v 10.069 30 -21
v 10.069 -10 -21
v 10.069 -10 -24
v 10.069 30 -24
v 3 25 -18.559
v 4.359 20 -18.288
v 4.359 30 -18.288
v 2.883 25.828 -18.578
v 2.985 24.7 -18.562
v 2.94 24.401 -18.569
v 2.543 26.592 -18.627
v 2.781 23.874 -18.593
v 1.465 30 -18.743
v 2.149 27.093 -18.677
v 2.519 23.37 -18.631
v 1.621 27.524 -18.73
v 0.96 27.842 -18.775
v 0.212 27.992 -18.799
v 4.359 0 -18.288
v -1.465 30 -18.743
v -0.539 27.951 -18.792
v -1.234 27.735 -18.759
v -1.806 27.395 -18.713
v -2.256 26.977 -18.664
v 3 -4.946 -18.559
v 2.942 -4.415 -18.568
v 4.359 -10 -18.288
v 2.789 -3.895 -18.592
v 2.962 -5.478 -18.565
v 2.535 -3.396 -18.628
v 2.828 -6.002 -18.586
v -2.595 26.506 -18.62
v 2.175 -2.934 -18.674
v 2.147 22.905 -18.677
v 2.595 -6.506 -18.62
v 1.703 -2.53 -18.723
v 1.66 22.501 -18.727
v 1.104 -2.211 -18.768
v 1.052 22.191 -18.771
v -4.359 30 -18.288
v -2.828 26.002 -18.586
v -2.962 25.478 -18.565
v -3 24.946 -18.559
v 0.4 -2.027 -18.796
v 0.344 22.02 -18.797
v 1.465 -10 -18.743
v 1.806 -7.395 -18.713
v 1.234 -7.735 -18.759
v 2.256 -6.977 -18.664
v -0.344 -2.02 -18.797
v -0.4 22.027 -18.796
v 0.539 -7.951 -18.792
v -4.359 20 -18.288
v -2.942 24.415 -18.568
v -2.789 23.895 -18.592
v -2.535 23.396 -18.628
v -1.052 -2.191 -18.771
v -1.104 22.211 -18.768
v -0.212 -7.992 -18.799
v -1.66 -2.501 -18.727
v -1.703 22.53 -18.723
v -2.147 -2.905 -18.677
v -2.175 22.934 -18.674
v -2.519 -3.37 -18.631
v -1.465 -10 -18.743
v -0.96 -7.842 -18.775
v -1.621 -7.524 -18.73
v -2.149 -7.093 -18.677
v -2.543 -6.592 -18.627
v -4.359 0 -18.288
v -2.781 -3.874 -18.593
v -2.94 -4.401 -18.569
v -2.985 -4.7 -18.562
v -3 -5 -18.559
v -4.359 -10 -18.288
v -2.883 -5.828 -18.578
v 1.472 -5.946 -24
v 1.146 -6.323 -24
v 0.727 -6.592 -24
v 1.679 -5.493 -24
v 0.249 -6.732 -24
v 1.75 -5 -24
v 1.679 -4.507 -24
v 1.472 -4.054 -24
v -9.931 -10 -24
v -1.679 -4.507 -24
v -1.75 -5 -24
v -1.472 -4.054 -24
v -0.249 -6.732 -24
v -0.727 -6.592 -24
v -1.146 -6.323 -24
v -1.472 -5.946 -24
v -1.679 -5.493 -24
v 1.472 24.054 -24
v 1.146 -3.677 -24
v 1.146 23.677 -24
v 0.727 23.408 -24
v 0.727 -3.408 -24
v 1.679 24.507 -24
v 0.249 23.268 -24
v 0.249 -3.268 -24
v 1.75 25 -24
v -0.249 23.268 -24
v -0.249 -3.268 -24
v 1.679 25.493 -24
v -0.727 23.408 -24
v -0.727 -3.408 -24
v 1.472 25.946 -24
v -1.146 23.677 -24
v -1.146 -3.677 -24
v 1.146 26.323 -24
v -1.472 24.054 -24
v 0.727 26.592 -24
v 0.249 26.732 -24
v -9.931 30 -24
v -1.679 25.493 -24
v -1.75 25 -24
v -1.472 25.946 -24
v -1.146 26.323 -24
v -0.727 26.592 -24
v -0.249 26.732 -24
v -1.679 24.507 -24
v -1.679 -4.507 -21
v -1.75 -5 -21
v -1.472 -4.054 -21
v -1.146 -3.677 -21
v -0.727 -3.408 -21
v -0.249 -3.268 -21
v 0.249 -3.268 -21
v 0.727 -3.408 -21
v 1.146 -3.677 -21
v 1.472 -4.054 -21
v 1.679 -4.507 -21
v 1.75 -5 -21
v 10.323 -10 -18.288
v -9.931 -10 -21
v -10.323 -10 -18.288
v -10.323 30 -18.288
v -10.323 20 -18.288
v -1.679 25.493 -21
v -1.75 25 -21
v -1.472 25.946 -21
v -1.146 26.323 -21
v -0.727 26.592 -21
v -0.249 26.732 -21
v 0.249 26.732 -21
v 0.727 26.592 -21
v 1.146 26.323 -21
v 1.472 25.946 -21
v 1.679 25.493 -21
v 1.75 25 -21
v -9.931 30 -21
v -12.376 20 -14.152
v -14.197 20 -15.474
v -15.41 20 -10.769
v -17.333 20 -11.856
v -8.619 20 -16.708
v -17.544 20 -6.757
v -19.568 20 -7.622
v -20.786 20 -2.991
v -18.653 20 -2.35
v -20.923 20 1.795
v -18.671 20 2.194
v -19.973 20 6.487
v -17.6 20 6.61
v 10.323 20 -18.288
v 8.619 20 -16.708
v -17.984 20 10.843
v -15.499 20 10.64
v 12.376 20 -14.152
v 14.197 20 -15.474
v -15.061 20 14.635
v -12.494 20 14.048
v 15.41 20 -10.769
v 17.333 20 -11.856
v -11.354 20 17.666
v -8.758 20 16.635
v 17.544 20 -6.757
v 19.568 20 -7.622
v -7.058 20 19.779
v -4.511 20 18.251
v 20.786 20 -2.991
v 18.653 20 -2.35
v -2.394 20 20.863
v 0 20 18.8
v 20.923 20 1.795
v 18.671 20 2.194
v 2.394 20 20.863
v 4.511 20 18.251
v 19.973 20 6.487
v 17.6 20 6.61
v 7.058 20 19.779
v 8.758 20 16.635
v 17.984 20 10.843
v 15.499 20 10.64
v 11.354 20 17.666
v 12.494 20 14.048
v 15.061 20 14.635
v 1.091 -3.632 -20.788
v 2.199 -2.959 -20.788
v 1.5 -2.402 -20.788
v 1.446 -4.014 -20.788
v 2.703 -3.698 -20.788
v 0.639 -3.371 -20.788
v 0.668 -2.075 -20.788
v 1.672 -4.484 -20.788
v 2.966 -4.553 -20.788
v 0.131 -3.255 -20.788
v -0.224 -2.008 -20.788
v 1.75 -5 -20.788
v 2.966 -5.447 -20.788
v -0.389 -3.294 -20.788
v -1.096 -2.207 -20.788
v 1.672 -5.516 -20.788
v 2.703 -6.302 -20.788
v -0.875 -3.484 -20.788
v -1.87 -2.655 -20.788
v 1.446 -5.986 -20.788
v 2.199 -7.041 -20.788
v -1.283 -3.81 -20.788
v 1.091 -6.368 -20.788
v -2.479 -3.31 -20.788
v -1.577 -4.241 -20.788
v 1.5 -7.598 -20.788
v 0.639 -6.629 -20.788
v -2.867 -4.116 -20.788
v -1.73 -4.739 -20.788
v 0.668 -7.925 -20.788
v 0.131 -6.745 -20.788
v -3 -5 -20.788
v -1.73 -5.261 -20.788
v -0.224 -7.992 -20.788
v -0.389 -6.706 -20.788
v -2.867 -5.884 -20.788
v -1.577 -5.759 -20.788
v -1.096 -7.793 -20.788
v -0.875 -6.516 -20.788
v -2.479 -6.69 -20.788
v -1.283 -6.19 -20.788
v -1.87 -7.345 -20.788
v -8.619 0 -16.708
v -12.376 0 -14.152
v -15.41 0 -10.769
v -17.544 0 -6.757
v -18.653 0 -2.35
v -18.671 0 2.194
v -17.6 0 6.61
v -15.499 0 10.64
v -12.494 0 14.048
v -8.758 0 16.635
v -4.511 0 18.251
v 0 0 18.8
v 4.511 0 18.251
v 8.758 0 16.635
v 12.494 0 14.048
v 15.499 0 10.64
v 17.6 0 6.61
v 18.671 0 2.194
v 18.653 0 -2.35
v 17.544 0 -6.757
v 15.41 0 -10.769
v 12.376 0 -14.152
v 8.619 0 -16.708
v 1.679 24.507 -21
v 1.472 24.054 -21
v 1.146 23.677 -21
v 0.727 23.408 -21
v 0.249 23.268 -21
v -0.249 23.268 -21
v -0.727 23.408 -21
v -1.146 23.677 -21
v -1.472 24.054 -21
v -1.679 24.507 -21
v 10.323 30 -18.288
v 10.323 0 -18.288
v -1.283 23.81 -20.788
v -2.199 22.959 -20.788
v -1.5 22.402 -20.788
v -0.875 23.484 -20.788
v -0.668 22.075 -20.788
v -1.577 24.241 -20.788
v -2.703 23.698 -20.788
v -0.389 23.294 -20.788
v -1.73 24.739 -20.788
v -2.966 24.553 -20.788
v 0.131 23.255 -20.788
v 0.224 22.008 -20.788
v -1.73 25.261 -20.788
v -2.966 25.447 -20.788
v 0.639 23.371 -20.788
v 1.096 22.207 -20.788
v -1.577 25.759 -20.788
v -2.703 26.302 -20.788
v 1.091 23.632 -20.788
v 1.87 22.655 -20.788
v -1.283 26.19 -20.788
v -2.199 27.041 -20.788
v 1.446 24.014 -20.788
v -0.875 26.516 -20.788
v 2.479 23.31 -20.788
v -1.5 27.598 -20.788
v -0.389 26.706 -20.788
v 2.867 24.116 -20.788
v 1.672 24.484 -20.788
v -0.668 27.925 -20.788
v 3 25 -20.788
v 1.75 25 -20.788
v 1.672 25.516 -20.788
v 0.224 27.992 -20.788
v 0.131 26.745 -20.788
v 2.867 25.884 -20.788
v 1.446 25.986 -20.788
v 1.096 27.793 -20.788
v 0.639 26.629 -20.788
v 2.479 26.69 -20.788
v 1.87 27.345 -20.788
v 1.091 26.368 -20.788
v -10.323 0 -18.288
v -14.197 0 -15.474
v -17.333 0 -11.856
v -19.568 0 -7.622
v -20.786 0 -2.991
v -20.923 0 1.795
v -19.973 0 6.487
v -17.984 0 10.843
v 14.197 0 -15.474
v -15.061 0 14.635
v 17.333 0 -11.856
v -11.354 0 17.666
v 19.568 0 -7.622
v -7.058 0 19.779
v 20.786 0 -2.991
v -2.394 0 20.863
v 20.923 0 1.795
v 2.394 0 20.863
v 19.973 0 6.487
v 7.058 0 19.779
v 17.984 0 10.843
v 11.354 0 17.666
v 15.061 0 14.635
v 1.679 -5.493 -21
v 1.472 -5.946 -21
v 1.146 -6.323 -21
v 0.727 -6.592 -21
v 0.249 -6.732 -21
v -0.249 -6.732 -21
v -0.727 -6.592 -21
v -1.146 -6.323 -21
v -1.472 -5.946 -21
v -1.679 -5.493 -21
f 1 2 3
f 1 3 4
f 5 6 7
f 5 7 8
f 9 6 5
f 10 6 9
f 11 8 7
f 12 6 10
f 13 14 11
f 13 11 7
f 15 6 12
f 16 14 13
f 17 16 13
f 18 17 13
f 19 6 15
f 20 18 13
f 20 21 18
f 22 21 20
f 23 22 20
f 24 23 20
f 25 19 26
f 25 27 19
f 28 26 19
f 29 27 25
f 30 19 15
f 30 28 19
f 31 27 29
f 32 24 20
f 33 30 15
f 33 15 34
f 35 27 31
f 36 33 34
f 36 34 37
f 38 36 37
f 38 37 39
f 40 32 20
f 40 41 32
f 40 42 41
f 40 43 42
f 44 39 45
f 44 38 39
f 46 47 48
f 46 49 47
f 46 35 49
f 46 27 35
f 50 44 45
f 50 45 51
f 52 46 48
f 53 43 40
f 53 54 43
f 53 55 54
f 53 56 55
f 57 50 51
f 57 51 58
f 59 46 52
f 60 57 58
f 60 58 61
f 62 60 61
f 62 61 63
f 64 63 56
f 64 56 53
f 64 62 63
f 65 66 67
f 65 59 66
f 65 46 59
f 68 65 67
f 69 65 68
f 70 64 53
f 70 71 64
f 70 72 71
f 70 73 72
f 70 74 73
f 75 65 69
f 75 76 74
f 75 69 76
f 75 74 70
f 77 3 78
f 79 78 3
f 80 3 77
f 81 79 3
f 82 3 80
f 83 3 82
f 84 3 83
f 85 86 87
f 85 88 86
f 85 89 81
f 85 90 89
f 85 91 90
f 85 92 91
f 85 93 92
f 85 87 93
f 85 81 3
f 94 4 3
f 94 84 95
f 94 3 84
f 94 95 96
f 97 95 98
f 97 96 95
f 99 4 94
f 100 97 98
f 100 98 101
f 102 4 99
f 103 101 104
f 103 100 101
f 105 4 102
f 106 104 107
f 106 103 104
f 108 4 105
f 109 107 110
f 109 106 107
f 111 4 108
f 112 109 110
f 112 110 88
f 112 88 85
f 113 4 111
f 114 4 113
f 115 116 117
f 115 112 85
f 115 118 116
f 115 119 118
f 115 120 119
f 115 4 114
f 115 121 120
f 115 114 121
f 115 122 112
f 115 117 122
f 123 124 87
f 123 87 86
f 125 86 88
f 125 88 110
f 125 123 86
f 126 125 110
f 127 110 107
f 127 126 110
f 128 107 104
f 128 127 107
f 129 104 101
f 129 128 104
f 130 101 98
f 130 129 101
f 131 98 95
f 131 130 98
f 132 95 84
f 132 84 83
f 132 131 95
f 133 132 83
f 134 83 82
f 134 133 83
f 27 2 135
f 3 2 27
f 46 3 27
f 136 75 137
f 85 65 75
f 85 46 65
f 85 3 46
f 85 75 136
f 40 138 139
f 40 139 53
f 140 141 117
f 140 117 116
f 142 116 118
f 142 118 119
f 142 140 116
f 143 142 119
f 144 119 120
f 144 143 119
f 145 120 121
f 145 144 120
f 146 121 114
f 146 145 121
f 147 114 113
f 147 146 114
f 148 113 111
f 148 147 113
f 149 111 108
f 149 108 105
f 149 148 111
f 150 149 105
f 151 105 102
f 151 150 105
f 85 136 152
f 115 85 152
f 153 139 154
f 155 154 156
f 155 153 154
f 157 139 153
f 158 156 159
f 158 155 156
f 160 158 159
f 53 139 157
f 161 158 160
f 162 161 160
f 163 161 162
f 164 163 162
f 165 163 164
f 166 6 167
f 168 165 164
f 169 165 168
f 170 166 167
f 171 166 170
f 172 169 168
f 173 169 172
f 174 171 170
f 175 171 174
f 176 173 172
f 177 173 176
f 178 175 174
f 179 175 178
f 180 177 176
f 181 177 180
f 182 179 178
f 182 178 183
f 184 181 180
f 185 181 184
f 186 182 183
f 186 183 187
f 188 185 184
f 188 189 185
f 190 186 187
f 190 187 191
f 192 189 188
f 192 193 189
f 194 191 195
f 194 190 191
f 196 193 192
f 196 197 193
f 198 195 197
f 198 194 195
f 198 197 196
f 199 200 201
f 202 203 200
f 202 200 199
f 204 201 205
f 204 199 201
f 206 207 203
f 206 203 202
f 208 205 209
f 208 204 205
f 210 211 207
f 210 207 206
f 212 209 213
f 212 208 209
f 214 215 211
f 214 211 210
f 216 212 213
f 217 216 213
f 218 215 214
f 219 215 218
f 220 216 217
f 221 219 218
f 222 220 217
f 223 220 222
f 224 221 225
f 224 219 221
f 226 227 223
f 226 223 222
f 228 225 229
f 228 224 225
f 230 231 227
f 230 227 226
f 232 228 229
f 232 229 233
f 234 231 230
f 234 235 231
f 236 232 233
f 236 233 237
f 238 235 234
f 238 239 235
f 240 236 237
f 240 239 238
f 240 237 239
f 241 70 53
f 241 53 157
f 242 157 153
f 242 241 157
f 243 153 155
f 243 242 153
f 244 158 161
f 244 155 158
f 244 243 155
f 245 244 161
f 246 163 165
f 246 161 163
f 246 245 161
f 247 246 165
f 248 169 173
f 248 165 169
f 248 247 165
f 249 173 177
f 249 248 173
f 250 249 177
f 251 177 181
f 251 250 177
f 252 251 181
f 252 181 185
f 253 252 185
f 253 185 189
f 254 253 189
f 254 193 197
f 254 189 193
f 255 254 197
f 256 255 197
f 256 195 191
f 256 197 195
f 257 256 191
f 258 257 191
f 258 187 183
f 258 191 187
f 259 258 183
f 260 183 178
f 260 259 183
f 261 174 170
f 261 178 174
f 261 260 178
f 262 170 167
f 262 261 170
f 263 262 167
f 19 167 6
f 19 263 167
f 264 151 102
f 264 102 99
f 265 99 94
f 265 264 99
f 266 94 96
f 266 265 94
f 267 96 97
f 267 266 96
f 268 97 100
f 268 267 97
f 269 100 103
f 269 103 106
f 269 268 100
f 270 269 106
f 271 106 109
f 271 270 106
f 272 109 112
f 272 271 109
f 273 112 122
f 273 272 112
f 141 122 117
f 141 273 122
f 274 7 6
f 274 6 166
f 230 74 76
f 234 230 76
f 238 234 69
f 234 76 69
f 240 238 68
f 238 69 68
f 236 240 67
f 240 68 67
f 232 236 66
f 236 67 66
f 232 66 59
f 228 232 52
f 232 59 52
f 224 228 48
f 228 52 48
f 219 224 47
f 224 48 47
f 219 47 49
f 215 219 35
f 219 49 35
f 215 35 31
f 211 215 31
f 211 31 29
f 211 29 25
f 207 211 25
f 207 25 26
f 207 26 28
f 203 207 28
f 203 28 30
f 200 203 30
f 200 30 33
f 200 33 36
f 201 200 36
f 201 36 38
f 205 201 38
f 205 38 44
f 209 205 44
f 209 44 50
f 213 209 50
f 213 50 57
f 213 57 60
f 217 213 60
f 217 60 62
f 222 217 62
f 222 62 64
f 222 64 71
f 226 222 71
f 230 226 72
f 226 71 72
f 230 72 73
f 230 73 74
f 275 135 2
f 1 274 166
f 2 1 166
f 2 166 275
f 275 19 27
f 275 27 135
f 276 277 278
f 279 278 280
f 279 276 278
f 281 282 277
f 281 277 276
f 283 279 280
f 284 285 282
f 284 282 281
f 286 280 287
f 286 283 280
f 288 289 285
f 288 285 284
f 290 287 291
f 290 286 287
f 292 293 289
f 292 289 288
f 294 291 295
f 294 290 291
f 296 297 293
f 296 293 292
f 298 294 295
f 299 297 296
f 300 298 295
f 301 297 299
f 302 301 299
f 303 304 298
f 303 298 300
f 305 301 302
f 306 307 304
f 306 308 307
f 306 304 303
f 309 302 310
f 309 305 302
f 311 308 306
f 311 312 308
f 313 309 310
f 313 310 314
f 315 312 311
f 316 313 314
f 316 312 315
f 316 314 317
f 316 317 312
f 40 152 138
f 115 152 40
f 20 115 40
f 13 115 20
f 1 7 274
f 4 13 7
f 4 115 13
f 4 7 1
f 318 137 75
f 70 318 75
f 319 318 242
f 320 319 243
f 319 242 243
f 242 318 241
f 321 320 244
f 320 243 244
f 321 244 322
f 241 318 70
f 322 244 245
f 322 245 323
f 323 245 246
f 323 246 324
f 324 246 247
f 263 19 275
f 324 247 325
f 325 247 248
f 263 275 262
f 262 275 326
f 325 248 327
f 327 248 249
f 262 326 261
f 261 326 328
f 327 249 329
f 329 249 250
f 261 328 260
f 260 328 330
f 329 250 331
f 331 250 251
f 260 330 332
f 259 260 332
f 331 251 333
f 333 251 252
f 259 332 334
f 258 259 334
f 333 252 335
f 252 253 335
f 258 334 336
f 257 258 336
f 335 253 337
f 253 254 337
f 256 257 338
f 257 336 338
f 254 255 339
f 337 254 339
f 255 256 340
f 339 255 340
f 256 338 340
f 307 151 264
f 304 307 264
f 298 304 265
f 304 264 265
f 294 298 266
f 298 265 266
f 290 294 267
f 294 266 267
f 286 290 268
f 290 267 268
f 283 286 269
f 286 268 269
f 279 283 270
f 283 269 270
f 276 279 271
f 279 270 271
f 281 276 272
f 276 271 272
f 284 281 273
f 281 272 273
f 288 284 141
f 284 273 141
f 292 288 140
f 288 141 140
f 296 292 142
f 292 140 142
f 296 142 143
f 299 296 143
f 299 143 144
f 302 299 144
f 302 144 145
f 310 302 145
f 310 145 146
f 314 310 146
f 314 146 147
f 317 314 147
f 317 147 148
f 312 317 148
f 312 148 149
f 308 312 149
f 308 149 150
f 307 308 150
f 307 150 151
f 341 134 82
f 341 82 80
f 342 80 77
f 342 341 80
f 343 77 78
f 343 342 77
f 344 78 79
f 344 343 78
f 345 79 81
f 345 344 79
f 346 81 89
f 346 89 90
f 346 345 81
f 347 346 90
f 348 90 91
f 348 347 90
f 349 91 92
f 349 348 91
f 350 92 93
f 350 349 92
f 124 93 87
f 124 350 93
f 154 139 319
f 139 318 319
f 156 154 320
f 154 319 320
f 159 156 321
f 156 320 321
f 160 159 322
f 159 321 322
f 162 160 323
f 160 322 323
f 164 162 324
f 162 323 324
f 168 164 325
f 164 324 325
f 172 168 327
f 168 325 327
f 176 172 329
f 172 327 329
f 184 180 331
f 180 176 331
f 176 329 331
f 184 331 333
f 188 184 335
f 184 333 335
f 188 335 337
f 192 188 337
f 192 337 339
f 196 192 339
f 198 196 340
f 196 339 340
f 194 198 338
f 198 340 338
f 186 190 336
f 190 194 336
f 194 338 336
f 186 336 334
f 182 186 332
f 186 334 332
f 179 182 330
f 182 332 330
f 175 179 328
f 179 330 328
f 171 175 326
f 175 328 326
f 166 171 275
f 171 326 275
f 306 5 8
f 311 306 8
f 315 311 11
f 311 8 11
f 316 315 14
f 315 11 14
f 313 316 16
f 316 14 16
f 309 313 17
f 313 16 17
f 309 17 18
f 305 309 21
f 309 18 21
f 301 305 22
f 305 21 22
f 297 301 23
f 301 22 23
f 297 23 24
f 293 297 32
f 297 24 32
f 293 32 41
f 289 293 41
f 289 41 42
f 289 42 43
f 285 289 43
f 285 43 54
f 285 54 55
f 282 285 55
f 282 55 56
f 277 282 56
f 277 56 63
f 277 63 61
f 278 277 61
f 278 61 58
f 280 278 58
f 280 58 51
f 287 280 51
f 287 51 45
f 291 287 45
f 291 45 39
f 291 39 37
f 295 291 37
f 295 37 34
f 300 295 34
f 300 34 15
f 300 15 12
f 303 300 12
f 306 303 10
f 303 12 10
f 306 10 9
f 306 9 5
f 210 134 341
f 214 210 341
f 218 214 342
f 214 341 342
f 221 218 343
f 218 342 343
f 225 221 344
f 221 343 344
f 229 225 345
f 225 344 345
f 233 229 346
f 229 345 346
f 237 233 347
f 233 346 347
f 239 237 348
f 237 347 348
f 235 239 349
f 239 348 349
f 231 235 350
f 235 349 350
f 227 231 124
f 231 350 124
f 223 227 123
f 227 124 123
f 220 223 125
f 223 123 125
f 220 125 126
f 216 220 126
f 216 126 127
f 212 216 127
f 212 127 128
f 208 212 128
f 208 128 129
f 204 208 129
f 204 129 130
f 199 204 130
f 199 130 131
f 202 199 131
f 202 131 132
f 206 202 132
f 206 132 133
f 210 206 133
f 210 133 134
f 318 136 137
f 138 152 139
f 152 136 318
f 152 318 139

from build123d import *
from build123d.topology import SkipClean

# Parameters (mm, degrees)
SKETCH1_R               = 21
SKETCH1_R_2             = 18.8
BOSS_EXTRUDE1_DEPTH     = 20
SKETCH2_W               = 20
SKETCH2_H               = 40
SKETCH2_R               = 1.75
BOSS_EXTRUDE2_DEPTH     = 3
BOSS_EXTRUDE3_REACH     = 53.157
SKETCH6_R               = 1.75
CUT_EXTRUDE2_DEPTH      = 59.017238817
SKETCH8_R               = 3
CUT_EXTRUDE3_DEPTH      = 2.5
CUT_EXTRUDE4_DEPTH      = 44.783558558
CUT_EXTRUDE4_DEPTH_BACK = 44.783558558
SKETCH5_R               = 18.8


with BuildPart() as part:
    # Sketch1 → Boss-Extrude1 (new body)
    with BuildSketch(Plane(origin=(0, 0, 0), x_dir=(1, 0, 0), z_dir=(0, 1, 0))):
        with Locations(Location((0, 0, 0), (0, 0, 270))):
            Circle(SKETCH1_R)
        with Locations(Location((0, 0, 0), (0, 0, 270))):
            Circle(SKETCH1_R_2, mode=Mode.SUBTRACT)
    extrude(amount=BOSS_EXTRUDE1_DEPTH)


with BuildPart() as body_2:
    # Sketch2 → Boss-Extrude2 (new body)
    with BuildSketch(Plane(origin=(0, 0, -21), x_dir=(-1, 0, 0), z_dir=(0, 0, -1))):
        with Locations((-0.068597586, 10)):
            Rectangle(SKETCH2_W, SKETCH2_H)
        with Locations((0, 25)):
            Circle(SKETCH2_R, mode=Mode.SUBTRACT)
        with Locations((0, -5)):
            Circle(SKETCH2_R, mode=Mode.SUBTRACT)
    extrude(amount=BOSS_EXTRUDE2_DEPTH)

    # Boss-Extrude3: up to this face of the body (flat: up to its plane)
    boss_extrude3_end = Plane(body_2.part.faces().sort_by_distance((0.068597586, -10, -22.5))[0])
    # Sketch3 → Boss-Extrude3 (add, up to the picked face)
    with BuildSketch(Plane(origin=(0, 30, 0), x_dir=(1, 0, 0), z_dir=(0, 1, 0)), mode=Mode.PRIVATE) as boss_extrude3_sk1:
        Polygon((-9.931402414, 21), (-10.322711145, 18.287745477), (10.322711145, 18.287745477), (10.068597586, 21), align=None)
    boss_extrude3_tool1 = split(extrude(boss_extrude3_sk1.sketch, amount=-BOSS_EXTRUDE3_REACH, mode=Mode.PRIVATE), bisect_by=boss_extrude3_end, keep=Keep.BOTH, mode=Mode.PRIVATE)

    add(part.part)  # Boss-Extrude3 merges part
    add(boss_extrude3_tool1.solids().sort_by(Axis((0.034117, 30, -19.636695), (0, -1, 0)))[0])

    # Sketch6 → Cut-Extrude2 (cut, through all)
    with BuildSketch(Plane(origin=(0, 0, -24), x_dir=(-1, 0, 0), z_dir=(0, 0, -1))):
        with Locations(Location((0, 25, 0), (0, 0, 180))):
            Circle(SKETCH6_R)
        with Locations(Location((0, -5, 0), (0, 0, 180))):
            Circle(SKETCH6_R)
    extrude(amount=-CUT_EXTRUDE2_DEPTH, mode=Mode.SUBTRACT)

    # Sketch8 → Cut-Extrude3 (cut)
    with SkipClean():  # the faces are left unmerged after this step: merging them gives an invalid solid
        with BuildSketch(Plane.XY.offset(-18.287745477)):
            with Locations((0, 25)):
                Circle(SKETCH8_R)
            with Locations(Location((0, -5, 0), (0, 0, 180))):
                Circle(SKETCH8_R)
        extrude(amount=-CUT_EXTRUDE3_DEPTH, mode=Mode.SUBTRACT)

    # Sketch5 → Cut-Extrude4 (cut, two sides: drawn at the far end of the back side and taken through both)
    with SkipClean():  # the faces are left unmerged after this step: merging them gives an invalid solid
        with BuildSketch(Plane(origin=(0, 20, 0), x_dir=(1, 0, 0), z_dir=(0, 1, 0)).offset(-CUT_EXTRUDE4_DEPTH_BACK)):
            with Locations(Location((0, 0, 0), (0, 0, 103.405798669))):
                Circle(SKETCH5_R)
        extrude(amount=CUT_EXTRUDE4_DEPTH + CUT_EXTRUDE4_DEPTH_BACK, mode=Mode.SUBTRACT)


solid = body_2.part
